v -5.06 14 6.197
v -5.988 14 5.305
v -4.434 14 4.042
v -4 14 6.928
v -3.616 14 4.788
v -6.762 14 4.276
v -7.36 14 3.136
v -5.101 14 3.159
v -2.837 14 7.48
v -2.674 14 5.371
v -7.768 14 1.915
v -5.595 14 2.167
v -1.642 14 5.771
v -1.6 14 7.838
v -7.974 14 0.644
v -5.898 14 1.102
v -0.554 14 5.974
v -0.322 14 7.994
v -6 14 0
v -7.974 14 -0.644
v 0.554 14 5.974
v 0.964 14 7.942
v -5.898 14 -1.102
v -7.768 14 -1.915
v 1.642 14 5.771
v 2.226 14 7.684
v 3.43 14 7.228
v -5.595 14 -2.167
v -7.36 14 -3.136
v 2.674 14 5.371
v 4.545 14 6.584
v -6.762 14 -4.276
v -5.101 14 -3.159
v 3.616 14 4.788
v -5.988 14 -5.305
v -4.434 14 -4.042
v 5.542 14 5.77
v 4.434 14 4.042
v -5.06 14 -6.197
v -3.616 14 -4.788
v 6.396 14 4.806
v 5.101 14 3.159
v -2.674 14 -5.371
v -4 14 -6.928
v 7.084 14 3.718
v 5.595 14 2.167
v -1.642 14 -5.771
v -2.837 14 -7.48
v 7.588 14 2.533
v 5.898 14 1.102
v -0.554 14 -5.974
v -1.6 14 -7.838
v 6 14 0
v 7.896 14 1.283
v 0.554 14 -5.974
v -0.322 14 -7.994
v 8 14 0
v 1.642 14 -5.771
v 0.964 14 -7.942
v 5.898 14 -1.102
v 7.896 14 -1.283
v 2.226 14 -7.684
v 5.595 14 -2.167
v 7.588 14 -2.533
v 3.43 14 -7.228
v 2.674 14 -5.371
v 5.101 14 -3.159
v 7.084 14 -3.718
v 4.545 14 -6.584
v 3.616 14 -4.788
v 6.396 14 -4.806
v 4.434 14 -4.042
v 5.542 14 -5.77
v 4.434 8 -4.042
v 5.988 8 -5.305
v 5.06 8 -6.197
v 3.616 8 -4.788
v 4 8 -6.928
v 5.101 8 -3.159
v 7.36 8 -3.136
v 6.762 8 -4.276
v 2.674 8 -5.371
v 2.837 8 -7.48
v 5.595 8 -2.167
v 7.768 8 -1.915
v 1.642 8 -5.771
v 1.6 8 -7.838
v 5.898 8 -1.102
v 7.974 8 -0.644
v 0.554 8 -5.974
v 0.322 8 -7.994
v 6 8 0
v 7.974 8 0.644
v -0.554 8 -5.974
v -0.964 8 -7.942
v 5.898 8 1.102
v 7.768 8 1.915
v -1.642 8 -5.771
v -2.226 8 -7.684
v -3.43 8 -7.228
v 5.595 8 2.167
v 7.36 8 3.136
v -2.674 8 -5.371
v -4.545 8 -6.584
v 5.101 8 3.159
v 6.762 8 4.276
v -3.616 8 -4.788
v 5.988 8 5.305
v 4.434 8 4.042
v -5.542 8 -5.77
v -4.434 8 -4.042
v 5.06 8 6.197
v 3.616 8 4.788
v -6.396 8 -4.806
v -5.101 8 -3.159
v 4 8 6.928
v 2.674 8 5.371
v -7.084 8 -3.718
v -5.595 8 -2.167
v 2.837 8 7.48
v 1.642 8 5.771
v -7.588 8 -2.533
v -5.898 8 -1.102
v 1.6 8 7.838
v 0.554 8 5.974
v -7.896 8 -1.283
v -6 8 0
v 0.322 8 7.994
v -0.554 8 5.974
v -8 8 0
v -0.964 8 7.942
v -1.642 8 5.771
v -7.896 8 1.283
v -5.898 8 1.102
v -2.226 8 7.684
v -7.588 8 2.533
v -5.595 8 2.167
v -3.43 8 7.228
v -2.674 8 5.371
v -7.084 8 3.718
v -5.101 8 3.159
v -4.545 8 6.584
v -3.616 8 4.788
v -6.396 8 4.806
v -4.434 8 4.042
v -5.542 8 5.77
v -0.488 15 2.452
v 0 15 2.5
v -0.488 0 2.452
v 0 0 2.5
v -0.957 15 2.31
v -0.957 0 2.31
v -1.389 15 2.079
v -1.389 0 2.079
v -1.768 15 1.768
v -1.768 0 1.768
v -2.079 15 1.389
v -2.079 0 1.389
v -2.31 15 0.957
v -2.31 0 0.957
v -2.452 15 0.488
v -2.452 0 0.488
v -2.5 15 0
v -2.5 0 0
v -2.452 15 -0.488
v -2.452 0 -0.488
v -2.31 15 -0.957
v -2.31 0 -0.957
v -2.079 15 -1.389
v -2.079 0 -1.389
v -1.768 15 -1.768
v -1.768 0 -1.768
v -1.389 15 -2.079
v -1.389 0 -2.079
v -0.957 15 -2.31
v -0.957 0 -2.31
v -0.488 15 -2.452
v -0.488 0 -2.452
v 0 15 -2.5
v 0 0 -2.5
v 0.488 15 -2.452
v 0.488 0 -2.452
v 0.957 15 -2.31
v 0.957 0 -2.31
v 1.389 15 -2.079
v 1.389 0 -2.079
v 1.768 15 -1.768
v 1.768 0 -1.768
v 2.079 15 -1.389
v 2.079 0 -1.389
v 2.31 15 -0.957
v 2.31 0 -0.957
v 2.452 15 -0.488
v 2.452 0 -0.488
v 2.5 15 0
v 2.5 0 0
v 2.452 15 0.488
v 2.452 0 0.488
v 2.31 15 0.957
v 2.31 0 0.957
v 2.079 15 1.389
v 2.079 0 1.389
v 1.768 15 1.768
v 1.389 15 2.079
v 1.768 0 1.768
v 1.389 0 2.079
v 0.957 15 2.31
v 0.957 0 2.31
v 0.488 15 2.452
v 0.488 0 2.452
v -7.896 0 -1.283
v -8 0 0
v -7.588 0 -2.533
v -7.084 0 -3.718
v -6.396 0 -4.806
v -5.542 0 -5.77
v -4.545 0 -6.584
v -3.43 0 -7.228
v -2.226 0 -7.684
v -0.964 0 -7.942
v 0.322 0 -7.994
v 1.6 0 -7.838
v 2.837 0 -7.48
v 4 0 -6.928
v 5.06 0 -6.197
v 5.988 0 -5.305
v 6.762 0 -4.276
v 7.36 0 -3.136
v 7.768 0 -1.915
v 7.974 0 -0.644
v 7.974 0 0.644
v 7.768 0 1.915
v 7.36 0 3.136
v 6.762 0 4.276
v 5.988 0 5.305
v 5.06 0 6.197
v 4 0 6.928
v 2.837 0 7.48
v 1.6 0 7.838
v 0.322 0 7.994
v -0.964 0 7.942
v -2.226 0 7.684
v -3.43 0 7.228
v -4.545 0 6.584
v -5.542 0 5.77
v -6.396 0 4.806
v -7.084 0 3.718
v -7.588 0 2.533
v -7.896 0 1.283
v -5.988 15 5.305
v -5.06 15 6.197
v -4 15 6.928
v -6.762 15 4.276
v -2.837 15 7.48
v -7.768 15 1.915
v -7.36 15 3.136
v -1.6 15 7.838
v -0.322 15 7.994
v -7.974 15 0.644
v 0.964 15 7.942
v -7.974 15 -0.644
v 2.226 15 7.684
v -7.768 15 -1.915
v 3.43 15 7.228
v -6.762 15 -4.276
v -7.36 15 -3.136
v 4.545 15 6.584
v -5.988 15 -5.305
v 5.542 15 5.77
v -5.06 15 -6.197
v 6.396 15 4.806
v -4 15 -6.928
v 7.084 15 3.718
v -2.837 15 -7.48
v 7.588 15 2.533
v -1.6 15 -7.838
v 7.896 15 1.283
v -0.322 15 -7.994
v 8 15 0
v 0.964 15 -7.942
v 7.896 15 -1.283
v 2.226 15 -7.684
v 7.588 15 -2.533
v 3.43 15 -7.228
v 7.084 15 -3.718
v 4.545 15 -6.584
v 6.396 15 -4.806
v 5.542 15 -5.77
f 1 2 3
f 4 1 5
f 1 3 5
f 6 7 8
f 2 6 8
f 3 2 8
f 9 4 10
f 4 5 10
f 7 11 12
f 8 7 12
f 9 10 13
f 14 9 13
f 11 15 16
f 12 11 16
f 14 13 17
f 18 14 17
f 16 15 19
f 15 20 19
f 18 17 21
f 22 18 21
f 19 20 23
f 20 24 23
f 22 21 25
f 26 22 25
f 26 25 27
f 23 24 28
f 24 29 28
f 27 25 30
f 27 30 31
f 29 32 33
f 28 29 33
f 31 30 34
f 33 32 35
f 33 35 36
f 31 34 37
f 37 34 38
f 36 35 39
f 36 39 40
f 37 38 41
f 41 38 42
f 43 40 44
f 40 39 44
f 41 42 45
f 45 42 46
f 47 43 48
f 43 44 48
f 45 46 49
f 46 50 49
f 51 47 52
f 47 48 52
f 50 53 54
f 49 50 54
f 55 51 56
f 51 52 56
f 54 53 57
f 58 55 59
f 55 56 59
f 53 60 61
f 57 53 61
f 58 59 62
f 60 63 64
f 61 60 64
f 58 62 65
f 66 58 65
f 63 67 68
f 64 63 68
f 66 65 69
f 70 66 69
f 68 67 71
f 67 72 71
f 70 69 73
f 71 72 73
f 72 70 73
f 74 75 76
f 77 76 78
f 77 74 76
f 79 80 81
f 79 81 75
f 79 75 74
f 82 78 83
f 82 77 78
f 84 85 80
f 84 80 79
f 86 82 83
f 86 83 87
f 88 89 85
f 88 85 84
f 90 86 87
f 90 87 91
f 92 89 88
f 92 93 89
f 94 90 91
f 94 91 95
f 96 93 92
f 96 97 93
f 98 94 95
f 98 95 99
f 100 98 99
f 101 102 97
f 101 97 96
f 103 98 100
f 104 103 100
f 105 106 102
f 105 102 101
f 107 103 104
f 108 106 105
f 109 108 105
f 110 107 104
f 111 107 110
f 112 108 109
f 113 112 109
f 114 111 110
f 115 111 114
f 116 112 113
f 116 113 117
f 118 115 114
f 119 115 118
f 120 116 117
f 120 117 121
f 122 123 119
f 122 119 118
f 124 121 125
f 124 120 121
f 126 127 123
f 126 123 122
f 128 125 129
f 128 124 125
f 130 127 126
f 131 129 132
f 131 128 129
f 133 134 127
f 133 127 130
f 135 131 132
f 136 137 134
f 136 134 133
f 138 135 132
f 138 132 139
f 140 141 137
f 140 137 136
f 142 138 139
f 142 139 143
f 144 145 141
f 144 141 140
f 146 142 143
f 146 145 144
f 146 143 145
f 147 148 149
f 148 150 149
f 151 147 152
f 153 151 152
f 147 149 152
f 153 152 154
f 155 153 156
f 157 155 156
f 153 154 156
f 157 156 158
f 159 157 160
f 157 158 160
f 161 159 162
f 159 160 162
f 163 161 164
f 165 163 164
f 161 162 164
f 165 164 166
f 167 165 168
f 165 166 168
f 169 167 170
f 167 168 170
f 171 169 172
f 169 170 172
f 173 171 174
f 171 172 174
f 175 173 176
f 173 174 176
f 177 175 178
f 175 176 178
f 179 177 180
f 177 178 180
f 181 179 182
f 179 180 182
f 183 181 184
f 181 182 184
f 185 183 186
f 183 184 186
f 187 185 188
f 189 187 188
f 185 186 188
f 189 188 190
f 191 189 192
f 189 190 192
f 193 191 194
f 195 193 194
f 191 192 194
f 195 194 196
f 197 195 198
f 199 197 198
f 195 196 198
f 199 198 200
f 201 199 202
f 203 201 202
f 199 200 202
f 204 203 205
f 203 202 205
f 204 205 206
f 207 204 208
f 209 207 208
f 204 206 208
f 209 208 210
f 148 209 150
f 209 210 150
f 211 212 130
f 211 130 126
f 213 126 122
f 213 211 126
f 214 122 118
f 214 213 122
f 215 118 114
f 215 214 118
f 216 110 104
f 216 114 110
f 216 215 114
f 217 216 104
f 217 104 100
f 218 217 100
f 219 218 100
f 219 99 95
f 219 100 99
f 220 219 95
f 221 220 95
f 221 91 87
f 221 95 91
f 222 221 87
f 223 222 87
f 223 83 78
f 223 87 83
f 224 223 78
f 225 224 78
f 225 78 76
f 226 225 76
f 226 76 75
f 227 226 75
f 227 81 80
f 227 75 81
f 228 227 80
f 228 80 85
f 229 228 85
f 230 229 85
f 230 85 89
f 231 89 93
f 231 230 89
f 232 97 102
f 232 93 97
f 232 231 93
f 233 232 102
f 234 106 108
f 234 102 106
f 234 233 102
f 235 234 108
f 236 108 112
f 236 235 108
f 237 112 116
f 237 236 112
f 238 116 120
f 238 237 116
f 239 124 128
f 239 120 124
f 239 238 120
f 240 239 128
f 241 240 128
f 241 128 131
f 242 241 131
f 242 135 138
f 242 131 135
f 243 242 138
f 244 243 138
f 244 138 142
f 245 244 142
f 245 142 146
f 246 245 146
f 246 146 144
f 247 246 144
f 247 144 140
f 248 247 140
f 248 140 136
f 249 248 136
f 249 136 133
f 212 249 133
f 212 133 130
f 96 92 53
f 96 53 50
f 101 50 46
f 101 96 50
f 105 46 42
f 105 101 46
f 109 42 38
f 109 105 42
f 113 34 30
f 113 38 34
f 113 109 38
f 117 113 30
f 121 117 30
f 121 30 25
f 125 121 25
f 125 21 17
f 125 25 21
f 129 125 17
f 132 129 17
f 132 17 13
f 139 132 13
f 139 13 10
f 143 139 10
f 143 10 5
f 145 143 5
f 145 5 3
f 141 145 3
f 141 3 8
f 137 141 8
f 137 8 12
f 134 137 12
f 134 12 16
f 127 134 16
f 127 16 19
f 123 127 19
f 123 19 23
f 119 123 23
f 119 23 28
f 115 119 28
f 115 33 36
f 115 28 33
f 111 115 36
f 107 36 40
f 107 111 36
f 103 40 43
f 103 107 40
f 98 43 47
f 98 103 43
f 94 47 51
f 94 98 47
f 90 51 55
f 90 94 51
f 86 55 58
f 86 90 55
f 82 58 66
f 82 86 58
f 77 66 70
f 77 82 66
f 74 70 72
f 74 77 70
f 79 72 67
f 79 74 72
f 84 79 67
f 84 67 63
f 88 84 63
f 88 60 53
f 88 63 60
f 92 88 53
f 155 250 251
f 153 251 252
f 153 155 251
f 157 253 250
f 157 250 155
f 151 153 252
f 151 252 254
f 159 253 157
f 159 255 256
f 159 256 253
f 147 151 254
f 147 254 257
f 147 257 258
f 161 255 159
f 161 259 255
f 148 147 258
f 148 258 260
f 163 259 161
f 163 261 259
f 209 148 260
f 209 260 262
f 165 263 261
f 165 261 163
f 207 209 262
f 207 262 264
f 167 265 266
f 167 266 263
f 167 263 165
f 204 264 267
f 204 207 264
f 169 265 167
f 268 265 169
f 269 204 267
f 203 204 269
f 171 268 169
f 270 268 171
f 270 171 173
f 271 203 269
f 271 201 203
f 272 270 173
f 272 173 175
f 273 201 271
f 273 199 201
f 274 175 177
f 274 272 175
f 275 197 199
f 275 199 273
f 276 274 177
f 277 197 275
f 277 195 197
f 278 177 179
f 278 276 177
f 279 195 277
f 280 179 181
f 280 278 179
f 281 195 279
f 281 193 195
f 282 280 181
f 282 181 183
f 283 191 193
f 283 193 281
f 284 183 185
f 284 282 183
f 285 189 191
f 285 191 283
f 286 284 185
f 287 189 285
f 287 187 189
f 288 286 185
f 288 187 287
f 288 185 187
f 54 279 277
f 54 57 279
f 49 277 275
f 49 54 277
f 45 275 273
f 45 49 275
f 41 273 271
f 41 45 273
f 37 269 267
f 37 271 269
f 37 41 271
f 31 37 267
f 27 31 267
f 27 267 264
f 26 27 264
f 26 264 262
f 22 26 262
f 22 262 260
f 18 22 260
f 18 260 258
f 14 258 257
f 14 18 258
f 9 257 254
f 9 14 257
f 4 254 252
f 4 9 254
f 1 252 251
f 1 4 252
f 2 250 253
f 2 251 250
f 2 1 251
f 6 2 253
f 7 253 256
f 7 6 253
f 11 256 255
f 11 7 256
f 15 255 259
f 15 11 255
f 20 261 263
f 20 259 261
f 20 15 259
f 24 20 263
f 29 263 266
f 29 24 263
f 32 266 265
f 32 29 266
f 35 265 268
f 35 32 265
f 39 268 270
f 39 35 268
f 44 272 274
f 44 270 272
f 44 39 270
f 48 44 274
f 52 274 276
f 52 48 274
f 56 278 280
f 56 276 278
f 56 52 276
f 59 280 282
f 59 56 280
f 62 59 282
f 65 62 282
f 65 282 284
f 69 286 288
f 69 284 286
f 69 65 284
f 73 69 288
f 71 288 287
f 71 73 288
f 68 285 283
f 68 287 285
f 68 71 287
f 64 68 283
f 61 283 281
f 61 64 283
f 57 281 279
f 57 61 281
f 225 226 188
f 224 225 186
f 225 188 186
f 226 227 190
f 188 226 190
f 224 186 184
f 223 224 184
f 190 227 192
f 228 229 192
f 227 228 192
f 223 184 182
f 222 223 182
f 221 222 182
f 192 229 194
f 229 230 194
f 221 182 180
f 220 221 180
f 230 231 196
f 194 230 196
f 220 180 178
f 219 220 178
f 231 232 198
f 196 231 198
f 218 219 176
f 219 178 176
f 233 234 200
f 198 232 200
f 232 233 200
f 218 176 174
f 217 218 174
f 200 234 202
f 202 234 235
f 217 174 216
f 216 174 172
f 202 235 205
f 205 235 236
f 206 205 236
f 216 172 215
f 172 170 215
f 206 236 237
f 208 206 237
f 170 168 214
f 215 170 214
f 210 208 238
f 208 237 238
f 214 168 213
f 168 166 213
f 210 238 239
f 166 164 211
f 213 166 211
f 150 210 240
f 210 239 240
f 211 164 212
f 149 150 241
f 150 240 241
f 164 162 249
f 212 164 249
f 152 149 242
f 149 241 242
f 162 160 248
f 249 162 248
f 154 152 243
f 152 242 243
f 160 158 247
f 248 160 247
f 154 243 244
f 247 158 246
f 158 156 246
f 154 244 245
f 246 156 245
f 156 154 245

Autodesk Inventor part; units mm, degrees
ref_plane "YZ Plane" through (0, 0, 0) normal (1, 0, 0) x (0, 1, 0)
ref_plane "XZ Plane" through (0, 0, 0) normal (0, 1, 0) x (-1, 0, 0)
ref_plane "XY Plane" through (0, 0, 0) normal (0, 0, 1) x (1, 0, 0)
sketch "Sketch1" plane through (0, 0, 0) normal (0, 1, 0) x (-1, 0, 0)
  circle A0 centre (0, 0) radius 8
  dimension "d0" = 16
extrude "Extrusion1" add sketch "Sketch1" along normal blind 8
sketch "Sketch2" plane through (0, 8, 0) normal (0, 1, 0) x (1, 0, 0)
  circle A0 centre (0, 0) radius 6
  dimension "d3" = 12
extrude "Extrusion2" add sketch "Sketch2" along normal blind 6
sketch "Sketch3" plane through (0, 14, 0) normal (0, 1, 0) x (1, 0, 0)
  circle A0 centre (0, 0) radius 8
  dimension "d6" = 16
extrude "Extrusion3" add sketch "Sketch3" along normal blind 1
sketch "Sketch4" plane through (0, 15, 0) normal (0, 1, 0) x (1, 0, 0)
  point P0 (0, 0)
  point P1 (0, 0)
hole "Hole1" at (0, 15, 0) direction (0, -1, 0) diameter 5 end through all
properties part number "GT2 20 Teeth Motor Pulley"
